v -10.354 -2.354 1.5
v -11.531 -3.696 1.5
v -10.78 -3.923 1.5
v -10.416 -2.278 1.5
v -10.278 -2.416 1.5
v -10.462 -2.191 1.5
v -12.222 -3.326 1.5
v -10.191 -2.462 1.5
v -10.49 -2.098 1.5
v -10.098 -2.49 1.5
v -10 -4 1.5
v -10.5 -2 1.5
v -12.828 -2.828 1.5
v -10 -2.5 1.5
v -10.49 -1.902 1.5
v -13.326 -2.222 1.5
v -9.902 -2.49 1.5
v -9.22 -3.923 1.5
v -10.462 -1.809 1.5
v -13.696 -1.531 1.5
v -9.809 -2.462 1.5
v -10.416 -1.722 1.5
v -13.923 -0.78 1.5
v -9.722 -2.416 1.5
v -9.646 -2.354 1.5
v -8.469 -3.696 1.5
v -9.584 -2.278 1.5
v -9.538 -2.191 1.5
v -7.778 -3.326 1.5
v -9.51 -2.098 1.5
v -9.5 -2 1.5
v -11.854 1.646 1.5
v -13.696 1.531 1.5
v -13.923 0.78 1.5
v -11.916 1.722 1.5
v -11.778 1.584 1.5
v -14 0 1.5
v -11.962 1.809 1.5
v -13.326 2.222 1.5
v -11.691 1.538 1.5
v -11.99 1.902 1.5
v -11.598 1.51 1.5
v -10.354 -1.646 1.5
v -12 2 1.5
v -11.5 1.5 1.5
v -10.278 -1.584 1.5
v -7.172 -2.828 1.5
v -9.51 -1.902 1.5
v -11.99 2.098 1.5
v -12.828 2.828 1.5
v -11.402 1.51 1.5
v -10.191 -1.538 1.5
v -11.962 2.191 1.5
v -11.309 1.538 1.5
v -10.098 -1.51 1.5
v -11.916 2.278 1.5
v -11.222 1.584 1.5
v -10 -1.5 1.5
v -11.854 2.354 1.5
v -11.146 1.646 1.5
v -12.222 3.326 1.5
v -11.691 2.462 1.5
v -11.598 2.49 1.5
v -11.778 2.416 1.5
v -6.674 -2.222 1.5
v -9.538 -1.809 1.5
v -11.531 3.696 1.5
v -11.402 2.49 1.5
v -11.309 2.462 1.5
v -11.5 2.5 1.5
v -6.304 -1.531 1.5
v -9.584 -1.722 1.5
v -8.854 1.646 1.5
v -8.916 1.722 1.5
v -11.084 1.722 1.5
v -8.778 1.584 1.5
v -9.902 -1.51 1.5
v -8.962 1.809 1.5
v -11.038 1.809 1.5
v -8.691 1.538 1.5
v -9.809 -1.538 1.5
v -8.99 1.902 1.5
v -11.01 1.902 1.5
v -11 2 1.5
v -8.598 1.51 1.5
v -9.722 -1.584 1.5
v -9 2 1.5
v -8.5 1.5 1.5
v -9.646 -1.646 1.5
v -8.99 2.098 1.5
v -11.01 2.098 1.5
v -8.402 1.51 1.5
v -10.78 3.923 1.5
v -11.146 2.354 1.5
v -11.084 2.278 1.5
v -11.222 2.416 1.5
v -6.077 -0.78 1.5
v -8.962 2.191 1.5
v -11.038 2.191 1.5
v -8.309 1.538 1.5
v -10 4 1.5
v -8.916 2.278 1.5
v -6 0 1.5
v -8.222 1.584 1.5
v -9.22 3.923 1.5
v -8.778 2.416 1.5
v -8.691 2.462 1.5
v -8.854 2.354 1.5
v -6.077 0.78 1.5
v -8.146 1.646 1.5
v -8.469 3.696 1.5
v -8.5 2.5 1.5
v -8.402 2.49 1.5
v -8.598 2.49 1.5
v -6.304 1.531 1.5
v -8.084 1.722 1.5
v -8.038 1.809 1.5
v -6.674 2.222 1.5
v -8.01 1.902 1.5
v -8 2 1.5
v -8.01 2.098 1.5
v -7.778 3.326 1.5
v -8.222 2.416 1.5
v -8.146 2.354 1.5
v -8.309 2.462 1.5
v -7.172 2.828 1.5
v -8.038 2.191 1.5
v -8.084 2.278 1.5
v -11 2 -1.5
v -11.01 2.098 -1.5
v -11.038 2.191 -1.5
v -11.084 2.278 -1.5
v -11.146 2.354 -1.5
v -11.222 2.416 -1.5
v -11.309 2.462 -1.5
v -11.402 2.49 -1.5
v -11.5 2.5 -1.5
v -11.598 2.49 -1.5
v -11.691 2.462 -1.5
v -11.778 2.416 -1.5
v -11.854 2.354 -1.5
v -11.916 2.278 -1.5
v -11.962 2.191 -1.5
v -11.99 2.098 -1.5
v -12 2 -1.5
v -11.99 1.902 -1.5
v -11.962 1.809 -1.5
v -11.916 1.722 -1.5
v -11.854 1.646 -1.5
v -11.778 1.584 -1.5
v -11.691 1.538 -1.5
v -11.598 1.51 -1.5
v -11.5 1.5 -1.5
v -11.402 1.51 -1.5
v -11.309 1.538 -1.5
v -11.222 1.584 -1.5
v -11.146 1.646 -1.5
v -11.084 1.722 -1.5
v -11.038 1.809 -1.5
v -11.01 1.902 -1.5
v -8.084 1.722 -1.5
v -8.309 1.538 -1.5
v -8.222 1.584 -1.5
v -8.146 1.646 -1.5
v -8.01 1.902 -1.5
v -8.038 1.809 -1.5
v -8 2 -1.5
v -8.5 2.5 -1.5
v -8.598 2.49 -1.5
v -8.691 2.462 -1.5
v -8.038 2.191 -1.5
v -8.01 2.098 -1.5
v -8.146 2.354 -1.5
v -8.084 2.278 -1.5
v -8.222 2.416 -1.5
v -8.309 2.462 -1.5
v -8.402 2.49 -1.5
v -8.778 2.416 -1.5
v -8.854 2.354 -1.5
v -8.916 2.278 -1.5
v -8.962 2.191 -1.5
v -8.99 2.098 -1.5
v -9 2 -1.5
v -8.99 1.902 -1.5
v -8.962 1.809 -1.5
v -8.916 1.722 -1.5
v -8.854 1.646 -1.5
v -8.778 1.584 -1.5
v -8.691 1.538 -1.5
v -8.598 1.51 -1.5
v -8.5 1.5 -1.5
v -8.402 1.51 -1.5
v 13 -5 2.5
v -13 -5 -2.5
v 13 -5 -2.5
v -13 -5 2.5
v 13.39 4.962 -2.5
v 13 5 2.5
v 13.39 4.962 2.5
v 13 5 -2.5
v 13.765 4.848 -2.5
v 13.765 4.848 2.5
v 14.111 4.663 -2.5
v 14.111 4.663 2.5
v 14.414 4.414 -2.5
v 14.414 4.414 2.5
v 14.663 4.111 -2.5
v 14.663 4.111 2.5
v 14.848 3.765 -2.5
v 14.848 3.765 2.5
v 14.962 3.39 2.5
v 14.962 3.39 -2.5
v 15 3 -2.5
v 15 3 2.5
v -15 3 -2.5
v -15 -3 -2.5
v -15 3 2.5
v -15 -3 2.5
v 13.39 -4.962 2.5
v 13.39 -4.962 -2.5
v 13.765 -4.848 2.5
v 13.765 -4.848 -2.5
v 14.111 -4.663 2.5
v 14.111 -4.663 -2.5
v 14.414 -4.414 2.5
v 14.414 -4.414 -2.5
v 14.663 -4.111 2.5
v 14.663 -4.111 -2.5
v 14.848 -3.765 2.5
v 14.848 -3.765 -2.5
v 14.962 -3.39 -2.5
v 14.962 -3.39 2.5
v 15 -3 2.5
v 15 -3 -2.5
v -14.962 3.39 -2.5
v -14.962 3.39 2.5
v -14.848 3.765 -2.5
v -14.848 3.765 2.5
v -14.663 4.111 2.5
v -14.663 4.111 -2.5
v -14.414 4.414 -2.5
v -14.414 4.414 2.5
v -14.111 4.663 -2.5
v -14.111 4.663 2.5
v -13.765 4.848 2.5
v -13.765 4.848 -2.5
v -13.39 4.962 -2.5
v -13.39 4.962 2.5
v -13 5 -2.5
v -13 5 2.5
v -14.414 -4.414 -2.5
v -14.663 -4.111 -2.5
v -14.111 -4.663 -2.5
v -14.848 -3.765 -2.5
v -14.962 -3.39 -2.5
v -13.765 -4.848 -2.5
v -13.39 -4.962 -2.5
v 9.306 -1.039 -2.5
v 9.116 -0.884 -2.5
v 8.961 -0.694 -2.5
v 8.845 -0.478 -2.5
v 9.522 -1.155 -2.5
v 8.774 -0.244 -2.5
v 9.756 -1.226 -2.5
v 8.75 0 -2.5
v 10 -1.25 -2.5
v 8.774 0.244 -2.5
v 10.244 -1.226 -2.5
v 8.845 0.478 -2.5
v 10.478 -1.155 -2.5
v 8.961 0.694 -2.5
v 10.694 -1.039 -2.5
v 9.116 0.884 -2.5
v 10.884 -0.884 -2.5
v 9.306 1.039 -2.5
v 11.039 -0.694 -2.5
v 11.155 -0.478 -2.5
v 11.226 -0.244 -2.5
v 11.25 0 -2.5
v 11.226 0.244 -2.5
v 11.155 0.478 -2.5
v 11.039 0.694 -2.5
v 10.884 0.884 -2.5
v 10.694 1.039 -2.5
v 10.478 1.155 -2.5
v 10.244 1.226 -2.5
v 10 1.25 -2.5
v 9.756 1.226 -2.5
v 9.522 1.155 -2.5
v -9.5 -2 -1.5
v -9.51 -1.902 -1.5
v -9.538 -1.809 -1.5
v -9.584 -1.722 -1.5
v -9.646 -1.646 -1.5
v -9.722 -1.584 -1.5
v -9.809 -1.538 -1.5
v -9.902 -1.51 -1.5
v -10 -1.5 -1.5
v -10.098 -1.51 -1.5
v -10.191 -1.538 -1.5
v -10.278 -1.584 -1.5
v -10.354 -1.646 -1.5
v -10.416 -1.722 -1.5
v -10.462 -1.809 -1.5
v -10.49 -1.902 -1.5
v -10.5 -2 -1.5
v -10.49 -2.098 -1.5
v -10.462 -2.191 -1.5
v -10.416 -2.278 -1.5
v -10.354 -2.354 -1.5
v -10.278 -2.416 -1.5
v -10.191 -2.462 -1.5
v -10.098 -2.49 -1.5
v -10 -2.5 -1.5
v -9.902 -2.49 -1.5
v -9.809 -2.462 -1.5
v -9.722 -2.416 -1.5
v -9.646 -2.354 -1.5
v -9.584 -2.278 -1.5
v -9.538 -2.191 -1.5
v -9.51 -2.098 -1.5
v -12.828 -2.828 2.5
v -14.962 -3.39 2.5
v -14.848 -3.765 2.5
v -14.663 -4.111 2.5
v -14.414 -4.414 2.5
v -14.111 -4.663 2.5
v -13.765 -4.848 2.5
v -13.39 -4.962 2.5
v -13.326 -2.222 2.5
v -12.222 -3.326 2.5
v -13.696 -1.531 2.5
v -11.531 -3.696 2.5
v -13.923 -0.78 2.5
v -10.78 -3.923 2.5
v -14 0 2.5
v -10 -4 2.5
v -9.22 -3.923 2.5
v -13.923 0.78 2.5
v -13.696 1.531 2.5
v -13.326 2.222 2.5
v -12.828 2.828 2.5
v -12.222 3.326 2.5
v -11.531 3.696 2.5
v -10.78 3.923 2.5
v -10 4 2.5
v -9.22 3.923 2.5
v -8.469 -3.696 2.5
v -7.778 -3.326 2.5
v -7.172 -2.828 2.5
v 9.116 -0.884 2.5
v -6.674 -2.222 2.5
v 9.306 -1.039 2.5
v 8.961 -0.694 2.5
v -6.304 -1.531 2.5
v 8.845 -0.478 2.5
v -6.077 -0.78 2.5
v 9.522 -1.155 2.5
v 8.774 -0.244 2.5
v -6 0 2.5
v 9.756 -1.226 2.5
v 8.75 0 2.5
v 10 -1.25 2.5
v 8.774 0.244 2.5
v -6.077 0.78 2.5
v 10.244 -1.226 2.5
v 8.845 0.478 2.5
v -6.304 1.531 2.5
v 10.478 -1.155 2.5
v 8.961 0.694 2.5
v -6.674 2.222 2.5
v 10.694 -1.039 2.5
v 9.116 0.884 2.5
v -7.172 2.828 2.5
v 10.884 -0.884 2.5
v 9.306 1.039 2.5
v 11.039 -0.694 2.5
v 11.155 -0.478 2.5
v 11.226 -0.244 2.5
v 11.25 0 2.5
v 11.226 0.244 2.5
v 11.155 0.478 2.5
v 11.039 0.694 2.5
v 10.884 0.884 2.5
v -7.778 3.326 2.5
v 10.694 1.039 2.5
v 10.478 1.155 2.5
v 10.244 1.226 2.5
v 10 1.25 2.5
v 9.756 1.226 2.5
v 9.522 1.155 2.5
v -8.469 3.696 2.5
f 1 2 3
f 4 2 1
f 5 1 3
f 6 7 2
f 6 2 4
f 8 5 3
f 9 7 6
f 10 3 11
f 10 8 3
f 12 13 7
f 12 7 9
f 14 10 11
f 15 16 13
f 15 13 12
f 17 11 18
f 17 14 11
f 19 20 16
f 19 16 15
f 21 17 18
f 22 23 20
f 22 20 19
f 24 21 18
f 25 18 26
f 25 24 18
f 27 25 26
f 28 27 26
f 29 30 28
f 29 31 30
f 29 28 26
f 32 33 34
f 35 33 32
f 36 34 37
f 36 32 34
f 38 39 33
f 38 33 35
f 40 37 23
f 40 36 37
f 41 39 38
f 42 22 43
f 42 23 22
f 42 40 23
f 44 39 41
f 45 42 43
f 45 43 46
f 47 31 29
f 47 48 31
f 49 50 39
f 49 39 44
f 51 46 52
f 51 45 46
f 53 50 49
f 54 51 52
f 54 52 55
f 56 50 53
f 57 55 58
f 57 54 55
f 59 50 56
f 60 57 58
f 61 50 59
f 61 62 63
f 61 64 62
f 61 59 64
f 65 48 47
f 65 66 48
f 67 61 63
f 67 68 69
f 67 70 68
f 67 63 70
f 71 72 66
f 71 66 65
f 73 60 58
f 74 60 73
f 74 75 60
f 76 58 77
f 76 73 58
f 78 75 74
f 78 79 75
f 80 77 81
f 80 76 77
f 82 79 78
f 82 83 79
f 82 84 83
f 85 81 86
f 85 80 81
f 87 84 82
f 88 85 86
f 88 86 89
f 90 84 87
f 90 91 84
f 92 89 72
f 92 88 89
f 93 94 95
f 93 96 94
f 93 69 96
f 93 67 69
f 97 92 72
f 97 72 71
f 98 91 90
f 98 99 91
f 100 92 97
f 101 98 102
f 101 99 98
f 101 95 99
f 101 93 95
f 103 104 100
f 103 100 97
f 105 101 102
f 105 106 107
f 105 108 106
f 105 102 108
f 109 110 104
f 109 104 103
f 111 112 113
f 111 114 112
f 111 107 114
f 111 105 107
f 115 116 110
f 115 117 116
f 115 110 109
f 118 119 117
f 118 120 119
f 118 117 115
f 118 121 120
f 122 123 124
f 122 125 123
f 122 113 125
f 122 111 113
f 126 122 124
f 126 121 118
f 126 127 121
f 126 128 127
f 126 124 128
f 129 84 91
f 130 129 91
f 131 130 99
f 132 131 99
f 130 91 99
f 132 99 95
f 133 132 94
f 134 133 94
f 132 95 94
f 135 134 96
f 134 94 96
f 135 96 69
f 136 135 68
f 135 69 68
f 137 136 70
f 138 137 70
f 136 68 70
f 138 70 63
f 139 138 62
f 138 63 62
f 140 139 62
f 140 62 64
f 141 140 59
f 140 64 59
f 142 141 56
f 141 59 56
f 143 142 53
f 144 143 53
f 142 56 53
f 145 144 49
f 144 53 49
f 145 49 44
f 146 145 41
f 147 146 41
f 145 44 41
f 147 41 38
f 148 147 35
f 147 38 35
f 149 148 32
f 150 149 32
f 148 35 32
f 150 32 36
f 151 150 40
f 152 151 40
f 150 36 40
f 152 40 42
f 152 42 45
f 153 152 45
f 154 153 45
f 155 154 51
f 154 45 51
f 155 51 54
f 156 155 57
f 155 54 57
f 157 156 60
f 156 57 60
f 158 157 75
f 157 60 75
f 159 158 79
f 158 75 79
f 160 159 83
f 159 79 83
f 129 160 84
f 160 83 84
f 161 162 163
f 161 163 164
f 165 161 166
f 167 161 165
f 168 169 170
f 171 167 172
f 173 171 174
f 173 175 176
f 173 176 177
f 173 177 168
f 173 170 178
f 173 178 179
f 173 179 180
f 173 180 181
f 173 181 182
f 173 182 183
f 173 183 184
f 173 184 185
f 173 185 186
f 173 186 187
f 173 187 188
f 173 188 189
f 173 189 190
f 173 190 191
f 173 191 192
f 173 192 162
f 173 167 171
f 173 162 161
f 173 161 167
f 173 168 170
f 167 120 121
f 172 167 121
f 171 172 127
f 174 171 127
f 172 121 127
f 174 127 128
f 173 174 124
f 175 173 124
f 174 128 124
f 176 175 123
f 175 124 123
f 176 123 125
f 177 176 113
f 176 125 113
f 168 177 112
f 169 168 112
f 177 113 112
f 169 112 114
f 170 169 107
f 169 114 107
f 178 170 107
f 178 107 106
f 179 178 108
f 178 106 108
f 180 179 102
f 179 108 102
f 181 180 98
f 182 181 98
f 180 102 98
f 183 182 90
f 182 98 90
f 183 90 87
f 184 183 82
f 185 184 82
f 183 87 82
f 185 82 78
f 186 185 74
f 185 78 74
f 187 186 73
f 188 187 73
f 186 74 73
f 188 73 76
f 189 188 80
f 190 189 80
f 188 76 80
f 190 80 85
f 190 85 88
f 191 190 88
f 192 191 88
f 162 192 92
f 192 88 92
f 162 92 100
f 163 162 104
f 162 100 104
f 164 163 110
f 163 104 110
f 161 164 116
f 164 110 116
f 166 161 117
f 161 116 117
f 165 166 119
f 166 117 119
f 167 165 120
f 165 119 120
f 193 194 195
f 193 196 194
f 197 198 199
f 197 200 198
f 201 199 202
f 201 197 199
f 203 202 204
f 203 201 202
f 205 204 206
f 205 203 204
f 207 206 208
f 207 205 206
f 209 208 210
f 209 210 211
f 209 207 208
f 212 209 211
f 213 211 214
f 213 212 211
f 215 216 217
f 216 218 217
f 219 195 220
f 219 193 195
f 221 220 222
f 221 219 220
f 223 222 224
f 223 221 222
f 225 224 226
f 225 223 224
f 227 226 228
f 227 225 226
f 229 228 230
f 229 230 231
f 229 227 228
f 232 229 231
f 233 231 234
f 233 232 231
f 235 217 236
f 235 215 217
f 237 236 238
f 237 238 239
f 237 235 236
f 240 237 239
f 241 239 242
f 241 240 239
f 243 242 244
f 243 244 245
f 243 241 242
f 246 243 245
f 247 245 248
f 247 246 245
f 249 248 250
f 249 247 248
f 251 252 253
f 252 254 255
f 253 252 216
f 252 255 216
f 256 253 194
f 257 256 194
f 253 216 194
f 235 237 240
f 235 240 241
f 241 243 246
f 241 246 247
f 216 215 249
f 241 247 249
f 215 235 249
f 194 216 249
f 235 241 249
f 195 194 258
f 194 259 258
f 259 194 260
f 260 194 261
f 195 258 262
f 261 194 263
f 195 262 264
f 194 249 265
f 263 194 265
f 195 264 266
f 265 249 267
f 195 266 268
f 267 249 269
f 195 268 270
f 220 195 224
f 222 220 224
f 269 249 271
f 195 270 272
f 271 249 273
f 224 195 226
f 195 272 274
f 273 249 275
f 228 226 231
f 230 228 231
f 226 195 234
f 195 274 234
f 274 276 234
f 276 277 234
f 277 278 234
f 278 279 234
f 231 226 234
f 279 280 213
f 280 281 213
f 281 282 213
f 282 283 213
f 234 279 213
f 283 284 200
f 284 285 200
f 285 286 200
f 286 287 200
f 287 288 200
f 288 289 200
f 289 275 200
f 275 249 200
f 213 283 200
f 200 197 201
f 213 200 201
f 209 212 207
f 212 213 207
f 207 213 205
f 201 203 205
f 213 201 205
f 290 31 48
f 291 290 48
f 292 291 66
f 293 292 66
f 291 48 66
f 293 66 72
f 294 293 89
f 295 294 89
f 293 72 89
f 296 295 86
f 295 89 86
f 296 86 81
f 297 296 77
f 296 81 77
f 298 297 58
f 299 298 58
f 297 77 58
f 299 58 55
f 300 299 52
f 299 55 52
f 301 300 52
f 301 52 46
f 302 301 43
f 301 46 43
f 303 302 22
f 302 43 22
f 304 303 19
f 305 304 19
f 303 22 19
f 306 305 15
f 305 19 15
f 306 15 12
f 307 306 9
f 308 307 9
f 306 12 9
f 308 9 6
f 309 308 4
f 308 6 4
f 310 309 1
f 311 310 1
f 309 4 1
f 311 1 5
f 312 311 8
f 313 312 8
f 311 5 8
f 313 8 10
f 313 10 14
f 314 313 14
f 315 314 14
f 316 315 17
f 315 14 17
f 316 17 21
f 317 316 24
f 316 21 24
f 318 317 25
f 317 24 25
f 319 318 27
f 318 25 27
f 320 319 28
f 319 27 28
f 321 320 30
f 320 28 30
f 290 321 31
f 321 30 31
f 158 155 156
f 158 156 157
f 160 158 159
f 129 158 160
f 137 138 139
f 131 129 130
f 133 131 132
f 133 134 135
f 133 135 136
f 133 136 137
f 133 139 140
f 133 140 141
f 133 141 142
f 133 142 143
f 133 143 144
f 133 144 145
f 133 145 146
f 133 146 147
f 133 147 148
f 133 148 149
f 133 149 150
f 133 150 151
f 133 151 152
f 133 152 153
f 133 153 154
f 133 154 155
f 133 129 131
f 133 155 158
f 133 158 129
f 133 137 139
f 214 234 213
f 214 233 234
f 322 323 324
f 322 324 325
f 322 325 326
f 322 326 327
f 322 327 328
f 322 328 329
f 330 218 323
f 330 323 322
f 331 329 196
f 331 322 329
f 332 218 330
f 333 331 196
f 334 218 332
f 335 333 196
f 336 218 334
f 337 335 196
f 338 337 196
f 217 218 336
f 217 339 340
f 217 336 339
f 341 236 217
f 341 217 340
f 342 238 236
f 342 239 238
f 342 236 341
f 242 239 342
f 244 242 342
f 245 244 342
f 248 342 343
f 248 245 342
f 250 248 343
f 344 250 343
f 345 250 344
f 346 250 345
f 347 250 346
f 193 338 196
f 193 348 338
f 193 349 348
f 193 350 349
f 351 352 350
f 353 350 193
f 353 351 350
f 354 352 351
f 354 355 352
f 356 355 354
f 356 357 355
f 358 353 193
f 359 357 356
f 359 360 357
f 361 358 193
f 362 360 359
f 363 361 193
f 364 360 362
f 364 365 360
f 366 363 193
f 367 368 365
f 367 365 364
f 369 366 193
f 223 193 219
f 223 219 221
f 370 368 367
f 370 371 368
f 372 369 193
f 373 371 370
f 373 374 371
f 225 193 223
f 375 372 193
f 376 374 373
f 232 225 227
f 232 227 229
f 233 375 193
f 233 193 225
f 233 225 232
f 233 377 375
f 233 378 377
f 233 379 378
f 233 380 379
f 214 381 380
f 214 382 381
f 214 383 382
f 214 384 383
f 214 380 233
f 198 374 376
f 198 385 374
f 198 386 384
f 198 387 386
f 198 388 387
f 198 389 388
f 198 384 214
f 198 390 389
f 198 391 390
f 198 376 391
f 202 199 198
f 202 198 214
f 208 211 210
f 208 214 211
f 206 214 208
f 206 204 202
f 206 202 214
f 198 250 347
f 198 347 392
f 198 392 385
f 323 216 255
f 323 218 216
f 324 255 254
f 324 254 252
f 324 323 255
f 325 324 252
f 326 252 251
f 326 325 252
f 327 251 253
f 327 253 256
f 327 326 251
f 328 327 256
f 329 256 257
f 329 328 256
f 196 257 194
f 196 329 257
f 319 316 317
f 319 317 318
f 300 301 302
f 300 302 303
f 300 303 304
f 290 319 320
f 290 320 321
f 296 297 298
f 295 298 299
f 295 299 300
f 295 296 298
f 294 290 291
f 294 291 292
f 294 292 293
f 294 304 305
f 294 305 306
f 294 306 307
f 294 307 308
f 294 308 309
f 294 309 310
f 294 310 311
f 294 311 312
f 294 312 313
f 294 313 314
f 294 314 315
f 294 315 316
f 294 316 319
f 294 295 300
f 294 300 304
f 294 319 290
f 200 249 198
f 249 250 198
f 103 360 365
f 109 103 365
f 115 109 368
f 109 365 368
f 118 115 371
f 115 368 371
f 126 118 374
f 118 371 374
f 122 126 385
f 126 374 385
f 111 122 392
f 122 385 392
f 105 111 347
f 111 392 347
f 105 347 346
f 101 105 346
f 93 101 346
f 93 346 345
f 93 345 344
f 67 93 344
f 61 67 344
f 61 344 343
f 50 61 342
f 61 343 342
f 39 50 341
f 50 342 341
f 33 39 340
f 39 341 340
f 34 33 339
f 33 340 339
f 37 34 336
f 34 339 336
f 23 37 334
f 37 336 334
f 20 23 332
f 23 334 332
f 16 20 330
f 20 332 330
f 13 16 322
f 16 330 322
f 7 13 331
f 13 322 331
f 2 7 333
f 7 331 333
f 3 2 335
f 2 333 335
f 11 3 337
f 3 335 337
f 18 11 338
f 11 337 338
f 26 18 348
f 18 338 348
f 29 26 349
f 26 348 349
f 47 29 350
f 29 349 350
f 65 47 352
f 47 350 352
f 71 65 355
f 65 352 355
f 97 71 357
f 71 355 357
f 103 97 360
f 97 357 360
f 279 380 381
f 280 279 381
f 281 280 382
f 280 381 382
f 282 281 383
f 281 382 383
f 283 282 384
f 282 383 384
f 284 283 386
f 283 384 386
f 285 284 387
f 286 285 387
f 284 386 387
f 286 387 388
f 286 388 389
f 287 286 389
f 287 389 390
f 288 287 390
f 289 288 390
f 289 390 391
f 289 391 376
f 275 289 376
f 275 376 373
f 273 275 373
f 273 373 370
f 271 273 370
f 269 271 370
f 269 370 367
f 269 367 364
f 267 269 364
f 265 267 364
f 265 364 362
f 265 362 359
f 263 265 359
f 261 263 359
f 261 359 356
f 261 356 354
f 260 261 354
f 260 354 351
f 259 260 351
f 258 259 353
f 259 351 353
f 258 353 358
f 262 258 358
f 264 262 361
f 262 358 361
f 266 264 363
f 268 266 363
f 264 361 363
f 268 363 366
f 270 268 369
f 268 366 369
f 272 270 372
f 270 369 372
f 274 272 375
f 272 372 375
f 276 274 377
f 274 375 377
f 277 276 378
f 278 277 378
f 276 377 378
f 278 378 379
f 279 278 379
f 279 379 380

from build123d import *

# Parameters (mm, degrees)
F0_W     = 30
F0_H     = 10
F1_DEPTH = 2.5
F2_R     = 4
F3_DEPTH = 1
F4_R     = 0.5
F5_DEPTH = 3
F6_R     = 1.25
F7_DEPTH = 5.001
F8_R     = 2


with BuildPart() as f1:
    # F0 (on Top) → F1 (new body, symmetric)
    with BuildSketch(Plane.XY):
        Rectangle(F0_W, F0_H)
    extrude(amount=F1_DEPTH, both=True)

    # F2 (on face) → F3 (cut)
    with BuildSketch(Plane.XY.offset(2.5)):
        with Locations((-10, 0)):
            Circle(F2_R)
    extrude(amount=-F3_DEPTH, mode=Mode.SUBTRACT)

    # F4 (on face) → F5 (cut)
    with BuildSketch(Plane.XY.offset(1.5)):
        with Locations((-11.5, 2)):
            Circle(F4_R)
        with Locations((-8.5, 2)):
            Circle(F4_R)
        with Locations((-10, -2)):
            Circle(F4_R)
    extrude(amount=-F5_DEPTH, mode=Mode.SUBTRACT)

    # F6 (on face) → F7 (cut, through all)
    with BuildSketch(Plane.XY.offset(2.5)):
        with Locations((10, 0)):
            Circle(F6_R)
    extrude(amount=-F7_DEPTH, mode=Mode.SUBTRACT)

    # F8
    f8_edges = [f1.edges().sort_by_distance(p)[0] for p in [
        (-15, -5, 0),
        (-15, 5, 0),
        (15, -5, 0),
        (15, 5, 0),
    ]]
    fillet(f8_edges, radius=F8_R)


solid = f1.part
